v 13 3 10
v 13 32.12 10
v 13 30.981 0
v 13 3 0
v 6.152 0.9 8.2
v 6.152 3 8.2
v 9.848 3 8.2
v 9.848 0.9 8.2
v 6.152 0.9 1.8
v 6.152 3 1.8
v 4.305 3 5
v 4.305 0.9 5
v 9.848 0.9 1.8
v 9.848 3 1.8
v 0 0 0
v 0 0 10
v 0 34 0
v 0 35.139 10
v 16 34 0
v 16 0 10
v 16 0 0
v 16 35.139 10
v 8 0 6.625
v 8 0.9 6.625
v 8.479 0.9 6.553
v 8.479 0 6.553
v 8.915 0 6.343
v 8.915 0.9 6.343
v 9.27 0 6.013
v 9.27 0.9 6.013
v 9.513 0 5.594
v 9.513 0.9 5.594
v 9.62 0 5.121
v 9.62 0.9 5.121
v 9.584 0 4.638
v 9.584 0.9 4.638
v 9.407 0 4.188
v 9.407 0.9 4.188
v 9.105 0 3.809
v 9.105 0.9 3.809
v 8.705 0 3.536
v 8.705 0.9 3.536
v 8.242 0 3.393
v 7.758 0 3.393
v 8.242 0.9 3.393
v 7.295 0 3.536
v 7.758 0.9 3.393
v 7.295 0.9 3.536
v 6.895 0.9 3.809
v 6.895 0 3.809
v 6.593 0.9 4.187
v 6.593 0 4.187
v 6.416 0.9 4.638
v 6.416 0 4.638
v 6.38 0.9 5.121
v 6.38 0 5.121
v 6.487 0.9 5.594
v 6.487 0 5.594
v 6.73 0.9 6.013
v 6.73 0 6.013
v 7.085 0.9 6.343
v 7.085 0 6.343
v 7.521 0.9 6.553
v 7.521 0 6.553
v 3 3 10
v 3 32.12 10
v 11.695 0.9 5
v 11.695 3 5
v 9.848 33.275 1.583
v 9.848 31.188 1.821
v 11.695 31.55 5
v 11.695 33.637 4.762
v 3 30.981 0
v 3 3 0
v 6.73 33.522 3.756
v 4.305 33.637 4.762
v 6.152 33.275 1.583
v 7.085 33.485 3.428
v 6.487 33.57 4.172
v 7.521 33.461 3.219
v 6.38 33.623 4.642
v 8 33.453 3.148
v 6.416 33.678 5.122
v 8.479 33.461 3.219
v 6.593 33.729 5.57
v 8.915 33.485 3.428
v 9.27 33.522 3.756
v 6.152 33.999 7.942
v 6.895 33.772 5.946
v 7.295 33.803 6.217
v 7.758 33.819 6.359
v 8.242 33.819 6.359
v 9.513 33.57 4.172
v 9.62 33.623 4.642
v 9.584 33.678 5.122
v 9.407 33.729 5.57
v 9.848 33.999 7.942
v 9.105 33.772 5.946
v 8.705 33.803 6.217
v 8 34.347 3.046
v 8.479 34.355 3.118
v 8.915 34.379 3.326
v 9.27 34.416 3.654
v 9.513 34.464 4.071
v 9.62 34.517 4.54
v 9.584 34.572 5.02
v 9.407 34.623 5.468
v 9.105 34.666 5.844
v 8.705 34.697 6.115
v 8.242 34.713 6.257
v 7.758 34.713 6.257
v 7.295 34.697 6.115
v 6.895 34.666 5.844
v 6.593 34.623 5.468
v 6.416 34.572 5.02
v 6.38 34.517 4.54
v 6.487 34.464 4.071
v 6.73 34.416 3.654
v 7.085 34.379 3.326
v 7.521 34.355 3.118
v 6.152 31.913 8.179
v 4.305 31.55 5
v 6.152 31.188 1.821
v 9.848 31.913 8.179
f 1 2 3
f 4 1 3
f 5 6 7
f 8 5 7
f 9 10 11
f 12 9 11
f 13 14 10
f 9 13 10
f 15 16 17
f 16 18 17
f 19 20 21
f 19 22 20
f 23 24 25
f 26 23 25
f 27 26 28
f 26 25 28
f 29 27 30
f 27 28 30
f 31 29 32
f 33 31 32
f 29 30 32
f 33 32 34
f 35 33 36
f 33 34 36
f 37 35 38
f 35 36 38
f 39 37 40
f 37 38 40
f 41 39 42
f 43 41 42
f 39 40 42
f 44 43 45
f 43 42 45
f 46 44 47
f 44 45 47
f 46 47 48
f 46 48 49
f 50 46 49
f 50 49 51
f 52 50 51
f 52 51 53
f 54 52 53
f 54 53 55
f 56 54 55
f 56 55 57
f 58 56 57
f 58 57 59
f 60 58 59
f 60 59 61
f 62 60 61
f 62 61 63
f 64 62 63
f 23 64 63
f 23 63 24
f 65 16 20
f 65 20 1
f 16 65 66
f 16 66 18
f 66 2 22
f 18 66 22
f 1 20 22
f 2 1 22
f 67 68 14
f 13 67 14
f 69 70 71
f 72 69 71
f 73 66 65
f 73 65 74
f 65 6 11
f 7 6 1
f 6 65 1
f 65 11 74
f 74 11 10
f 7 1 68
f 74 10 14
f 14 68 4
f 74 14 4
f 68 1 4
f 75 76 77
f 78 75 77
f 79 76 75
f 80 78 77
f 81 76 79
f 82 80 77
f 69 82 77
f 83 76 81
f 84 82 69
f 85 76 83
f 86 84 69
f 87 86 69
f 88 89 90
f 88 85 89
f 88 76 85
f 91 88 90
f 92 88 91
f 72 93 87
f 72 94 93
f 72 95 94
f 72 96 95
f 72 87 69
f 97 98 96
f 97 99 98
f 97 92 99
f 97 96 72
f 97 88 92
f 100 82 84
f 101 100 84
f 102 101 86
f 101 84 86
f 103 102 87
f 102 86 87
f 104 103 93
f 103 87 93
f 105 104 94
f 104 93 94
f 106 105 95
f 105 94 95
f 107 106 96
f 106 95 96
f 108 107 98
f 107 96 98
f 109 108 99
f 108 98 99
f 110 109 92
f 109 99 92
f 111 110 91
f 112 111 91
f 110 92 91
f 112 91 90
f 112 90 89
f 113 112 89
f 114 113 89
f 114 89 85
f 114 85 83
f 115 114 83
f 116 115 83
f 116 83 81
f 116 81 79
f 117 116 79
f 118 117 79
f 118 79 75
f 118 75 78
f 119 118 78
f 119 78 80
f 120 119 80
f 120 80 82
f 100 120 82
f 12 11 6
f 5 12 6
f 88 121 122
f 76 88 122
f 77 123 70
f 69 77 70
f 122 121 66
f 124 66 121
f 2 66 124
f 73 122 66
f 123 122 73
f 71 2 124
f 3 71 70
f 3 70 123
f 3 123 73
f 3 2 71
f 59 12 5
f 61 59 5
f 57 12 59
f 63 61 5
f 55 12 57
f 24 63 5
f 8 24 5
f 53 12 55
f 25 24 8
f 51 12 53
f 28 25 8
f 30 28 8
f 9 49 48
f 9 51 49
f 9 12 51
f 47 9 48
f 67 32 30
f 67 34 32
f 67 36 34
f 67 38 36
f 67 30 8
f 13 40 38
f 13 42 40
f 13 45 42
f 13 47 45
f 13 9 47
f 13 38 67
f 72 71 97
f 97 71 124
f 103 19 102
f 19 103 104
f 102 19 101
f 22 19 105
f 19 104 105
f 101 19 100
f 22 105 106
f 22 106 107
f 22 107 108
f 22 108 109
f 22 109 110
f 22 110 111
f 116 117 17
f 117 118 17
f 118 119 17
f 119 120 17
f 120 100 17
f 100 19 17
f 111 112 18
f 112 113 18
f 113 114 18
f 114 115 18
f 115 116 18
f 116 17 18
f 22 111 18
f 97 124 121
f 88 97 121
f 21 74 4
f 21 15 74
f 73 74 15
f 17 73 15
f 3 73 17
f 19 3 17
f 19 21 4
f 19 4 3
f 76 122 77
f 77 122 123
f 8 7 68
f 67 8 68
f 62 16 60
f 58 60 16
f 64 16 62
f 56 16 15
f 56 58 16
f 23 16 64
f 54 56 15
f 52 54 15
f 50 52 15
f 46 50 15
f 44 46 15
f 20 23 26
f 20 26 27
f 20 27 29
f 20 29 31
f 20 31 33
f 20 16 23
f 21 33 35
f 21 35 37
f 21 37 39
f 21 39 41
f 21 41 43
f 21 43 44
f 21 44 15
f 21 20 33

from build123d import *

# Parameters (mm, degrees)
SKETCH1_W           = 10
SKETCH1_H           = 34
BOSS_EXTRUDE1_DEPTH = 3
SKETCH2_W           = 10
SKETCH2_H           = 3
BOSS_EXTRUDE2_DEPTH = 3
SKETCH2_4_W         = 10
SKETCH2_4_H         = 3
BOSS_EXTRUDE3_DEPTH = 10
SKETCH6_R           = 1.625
CUT_EXTRUDE3_DEPTH  = 2.1
SKETCH6_3_R         = 1.625
CUT_EXTRUDE4_DEPTH  = 38.056556836
SKETCH5_R           = 1.625
CUT_EXTRUDE5_DEPTH  = 2.1
SKETCH5_4_R         = 1.625
CUT_EXTRUDE6_DEPTH  = 38.268461324


with BuildPart() as part:
    # Sketch1 → Boss-Extrude1 (new body)
    with BuildSketch(Plane(origin=(0, 0, 0), x_dir=(0, 0, -1), z_dir=(1, 0, 0))):
        with Locations((-5, 17)):
            Rectangle(SKETCH1_W, SKETCH1_H)
        Polygon((-10, 35.139356083), (0, 34), (-10, 34), align=None)
    extrude(amount=BOSS_EXTRUDE1_DEPTH)



with BuildPart() as body_2:
    # Sketch2 → Boss-Extrude2 (new body)
    with BuildSketch(Plane(origin=(13, 0, 0), x_dir=(0, 0, -1), z_dir=(1, 0, 0))):
        with Locations((-5, 1.5)):
            Rectangle(SKETCH2_W, SKETCH2_H)
        Polygon((-10, 3), (0, 3), (0, 30.980590802), (-10, 32.119946885), align=None)
        Polygon((-10, 32.119946885), (0, 30.980590802), (0, 34), (-10, 34), align=None)
        Polygon((-10, 34), (0, 34), (-10, 35.139356083), align=None)
    extrude(amount=BOSS_EXTRUDE2_DEPTH)


with BuildPart() as part_1:
    add(part.part)

    add(body_2.part)  # Boss-Extrude3 merges body 2
    # Sketch2<4> → Boss-Extrude3 (add)
    with BuildSketch(Plane(origin=(13, 0, 0), x_dir=(0, 0, -1), z_dir=(1, 0, 0))):
        with Locations((-5, 1.5)):
            Rectangle(SKETCH2_4_W, SKETCH2_4_H)
        Polygon((-10, 32.119946885), (0, 30.980590802), (0, 34), (-10, 34), align=None)
        Polygon((0, 34), (-10, 34), (-10, 35.139356083), align=None)
    extrude(amount=-BOSS_EXTRUDE3_DEPTH)

    # Sketch6 → Cut-Extrude3 (cut)
    # profile 1 of 2: a face of its own
    with BuildSketch(Plane(origin=(0, 30.583575534, -3.484558283), x_dir=(1, 0, 0), z_dir=(0, -0.9935718556765885, 0.11320321376789935))):
        Polygon((4.304958277, 8.539451107), (6.152479139, 5.339451107), (9.847520861, 5.339451107), (11.695041723, 8.539451107), (9.847520861, 11.739451107), (6.152479139, 11.739451107), align=None)
        with Locations((8, 8.539451107)):
            Circle(SKETCH6_R, mode=Mode.SUBTRACT)
    # profile 2 of 2: a face of its own
    with BuildSketch(Plane(origin=(0, 30.583575534, -3.484558283), x_dir=(1, 0, 0), z_dir=(0, -0.9935718556765885, 0.11320321376789935))):
        with Locations((8, 8.539451107)):
            Circle(SKETCH6_R)
    extrude(amount=-CUT_EXTRUDE3_DEPTH, mode=Mode.SUBTRACT)

    # Sketch6<3> → Cut-Extrude4 (cut, through all)
    with BuildSketch(Plane(origin=(0, 30.583575534, -3.484558283), x_dir=(1, 0, 0), z_dir=(0, -0.9935718556765885, 0.11320321376789935))):
        with Locations(Location((8, 8.539451107, 0), (0, 0, 270))):
            Circle(SKETCH6_3_R)
    extrude(amount=-CUT_EXTRUDE4_DEPTH, mode=Mode.SUBTRACT)

    # Sketch5 → Cut-Extrude5 (cut)
    with BuildSketch(Plane(origin=(0, 3, 0), x_dir=(1, 0, 0), z_dir=(0, 1, 0))):
        Polygon((6.152479139, -1.8), (4.304958277, -5), (6.152479139, -8.2), (9.847520861, -8.2), (11.695041723, -5), (9.847520861, -1.8), align=None)
        with Locations(Location((8, -5, 0), (0, 0, 270))):
            Circle(SKETCH5_R, mode=Mode.SUBTRACT)
    extrude(amount=-CUT_EXTRUDE5_DEPTH, mode=Mode.SUBTRACT)

    # Sketch5<4> → Cut-Extrude6 (cut, through all)
    with BuildSketch(Plane(origin=(0, 3, 0), x_dir=(1, 0, 0), z_dir=(0, 1, 0))):
        with Locations(Location((8, -5, 0), (0, 0, 270))):
            Circle(SKETCH5_4_R)
    extrude(amount=-CUT_EXTRUDE6_DEPTH, mode=Mode.SUBTRACT)


solid = part_1.part
